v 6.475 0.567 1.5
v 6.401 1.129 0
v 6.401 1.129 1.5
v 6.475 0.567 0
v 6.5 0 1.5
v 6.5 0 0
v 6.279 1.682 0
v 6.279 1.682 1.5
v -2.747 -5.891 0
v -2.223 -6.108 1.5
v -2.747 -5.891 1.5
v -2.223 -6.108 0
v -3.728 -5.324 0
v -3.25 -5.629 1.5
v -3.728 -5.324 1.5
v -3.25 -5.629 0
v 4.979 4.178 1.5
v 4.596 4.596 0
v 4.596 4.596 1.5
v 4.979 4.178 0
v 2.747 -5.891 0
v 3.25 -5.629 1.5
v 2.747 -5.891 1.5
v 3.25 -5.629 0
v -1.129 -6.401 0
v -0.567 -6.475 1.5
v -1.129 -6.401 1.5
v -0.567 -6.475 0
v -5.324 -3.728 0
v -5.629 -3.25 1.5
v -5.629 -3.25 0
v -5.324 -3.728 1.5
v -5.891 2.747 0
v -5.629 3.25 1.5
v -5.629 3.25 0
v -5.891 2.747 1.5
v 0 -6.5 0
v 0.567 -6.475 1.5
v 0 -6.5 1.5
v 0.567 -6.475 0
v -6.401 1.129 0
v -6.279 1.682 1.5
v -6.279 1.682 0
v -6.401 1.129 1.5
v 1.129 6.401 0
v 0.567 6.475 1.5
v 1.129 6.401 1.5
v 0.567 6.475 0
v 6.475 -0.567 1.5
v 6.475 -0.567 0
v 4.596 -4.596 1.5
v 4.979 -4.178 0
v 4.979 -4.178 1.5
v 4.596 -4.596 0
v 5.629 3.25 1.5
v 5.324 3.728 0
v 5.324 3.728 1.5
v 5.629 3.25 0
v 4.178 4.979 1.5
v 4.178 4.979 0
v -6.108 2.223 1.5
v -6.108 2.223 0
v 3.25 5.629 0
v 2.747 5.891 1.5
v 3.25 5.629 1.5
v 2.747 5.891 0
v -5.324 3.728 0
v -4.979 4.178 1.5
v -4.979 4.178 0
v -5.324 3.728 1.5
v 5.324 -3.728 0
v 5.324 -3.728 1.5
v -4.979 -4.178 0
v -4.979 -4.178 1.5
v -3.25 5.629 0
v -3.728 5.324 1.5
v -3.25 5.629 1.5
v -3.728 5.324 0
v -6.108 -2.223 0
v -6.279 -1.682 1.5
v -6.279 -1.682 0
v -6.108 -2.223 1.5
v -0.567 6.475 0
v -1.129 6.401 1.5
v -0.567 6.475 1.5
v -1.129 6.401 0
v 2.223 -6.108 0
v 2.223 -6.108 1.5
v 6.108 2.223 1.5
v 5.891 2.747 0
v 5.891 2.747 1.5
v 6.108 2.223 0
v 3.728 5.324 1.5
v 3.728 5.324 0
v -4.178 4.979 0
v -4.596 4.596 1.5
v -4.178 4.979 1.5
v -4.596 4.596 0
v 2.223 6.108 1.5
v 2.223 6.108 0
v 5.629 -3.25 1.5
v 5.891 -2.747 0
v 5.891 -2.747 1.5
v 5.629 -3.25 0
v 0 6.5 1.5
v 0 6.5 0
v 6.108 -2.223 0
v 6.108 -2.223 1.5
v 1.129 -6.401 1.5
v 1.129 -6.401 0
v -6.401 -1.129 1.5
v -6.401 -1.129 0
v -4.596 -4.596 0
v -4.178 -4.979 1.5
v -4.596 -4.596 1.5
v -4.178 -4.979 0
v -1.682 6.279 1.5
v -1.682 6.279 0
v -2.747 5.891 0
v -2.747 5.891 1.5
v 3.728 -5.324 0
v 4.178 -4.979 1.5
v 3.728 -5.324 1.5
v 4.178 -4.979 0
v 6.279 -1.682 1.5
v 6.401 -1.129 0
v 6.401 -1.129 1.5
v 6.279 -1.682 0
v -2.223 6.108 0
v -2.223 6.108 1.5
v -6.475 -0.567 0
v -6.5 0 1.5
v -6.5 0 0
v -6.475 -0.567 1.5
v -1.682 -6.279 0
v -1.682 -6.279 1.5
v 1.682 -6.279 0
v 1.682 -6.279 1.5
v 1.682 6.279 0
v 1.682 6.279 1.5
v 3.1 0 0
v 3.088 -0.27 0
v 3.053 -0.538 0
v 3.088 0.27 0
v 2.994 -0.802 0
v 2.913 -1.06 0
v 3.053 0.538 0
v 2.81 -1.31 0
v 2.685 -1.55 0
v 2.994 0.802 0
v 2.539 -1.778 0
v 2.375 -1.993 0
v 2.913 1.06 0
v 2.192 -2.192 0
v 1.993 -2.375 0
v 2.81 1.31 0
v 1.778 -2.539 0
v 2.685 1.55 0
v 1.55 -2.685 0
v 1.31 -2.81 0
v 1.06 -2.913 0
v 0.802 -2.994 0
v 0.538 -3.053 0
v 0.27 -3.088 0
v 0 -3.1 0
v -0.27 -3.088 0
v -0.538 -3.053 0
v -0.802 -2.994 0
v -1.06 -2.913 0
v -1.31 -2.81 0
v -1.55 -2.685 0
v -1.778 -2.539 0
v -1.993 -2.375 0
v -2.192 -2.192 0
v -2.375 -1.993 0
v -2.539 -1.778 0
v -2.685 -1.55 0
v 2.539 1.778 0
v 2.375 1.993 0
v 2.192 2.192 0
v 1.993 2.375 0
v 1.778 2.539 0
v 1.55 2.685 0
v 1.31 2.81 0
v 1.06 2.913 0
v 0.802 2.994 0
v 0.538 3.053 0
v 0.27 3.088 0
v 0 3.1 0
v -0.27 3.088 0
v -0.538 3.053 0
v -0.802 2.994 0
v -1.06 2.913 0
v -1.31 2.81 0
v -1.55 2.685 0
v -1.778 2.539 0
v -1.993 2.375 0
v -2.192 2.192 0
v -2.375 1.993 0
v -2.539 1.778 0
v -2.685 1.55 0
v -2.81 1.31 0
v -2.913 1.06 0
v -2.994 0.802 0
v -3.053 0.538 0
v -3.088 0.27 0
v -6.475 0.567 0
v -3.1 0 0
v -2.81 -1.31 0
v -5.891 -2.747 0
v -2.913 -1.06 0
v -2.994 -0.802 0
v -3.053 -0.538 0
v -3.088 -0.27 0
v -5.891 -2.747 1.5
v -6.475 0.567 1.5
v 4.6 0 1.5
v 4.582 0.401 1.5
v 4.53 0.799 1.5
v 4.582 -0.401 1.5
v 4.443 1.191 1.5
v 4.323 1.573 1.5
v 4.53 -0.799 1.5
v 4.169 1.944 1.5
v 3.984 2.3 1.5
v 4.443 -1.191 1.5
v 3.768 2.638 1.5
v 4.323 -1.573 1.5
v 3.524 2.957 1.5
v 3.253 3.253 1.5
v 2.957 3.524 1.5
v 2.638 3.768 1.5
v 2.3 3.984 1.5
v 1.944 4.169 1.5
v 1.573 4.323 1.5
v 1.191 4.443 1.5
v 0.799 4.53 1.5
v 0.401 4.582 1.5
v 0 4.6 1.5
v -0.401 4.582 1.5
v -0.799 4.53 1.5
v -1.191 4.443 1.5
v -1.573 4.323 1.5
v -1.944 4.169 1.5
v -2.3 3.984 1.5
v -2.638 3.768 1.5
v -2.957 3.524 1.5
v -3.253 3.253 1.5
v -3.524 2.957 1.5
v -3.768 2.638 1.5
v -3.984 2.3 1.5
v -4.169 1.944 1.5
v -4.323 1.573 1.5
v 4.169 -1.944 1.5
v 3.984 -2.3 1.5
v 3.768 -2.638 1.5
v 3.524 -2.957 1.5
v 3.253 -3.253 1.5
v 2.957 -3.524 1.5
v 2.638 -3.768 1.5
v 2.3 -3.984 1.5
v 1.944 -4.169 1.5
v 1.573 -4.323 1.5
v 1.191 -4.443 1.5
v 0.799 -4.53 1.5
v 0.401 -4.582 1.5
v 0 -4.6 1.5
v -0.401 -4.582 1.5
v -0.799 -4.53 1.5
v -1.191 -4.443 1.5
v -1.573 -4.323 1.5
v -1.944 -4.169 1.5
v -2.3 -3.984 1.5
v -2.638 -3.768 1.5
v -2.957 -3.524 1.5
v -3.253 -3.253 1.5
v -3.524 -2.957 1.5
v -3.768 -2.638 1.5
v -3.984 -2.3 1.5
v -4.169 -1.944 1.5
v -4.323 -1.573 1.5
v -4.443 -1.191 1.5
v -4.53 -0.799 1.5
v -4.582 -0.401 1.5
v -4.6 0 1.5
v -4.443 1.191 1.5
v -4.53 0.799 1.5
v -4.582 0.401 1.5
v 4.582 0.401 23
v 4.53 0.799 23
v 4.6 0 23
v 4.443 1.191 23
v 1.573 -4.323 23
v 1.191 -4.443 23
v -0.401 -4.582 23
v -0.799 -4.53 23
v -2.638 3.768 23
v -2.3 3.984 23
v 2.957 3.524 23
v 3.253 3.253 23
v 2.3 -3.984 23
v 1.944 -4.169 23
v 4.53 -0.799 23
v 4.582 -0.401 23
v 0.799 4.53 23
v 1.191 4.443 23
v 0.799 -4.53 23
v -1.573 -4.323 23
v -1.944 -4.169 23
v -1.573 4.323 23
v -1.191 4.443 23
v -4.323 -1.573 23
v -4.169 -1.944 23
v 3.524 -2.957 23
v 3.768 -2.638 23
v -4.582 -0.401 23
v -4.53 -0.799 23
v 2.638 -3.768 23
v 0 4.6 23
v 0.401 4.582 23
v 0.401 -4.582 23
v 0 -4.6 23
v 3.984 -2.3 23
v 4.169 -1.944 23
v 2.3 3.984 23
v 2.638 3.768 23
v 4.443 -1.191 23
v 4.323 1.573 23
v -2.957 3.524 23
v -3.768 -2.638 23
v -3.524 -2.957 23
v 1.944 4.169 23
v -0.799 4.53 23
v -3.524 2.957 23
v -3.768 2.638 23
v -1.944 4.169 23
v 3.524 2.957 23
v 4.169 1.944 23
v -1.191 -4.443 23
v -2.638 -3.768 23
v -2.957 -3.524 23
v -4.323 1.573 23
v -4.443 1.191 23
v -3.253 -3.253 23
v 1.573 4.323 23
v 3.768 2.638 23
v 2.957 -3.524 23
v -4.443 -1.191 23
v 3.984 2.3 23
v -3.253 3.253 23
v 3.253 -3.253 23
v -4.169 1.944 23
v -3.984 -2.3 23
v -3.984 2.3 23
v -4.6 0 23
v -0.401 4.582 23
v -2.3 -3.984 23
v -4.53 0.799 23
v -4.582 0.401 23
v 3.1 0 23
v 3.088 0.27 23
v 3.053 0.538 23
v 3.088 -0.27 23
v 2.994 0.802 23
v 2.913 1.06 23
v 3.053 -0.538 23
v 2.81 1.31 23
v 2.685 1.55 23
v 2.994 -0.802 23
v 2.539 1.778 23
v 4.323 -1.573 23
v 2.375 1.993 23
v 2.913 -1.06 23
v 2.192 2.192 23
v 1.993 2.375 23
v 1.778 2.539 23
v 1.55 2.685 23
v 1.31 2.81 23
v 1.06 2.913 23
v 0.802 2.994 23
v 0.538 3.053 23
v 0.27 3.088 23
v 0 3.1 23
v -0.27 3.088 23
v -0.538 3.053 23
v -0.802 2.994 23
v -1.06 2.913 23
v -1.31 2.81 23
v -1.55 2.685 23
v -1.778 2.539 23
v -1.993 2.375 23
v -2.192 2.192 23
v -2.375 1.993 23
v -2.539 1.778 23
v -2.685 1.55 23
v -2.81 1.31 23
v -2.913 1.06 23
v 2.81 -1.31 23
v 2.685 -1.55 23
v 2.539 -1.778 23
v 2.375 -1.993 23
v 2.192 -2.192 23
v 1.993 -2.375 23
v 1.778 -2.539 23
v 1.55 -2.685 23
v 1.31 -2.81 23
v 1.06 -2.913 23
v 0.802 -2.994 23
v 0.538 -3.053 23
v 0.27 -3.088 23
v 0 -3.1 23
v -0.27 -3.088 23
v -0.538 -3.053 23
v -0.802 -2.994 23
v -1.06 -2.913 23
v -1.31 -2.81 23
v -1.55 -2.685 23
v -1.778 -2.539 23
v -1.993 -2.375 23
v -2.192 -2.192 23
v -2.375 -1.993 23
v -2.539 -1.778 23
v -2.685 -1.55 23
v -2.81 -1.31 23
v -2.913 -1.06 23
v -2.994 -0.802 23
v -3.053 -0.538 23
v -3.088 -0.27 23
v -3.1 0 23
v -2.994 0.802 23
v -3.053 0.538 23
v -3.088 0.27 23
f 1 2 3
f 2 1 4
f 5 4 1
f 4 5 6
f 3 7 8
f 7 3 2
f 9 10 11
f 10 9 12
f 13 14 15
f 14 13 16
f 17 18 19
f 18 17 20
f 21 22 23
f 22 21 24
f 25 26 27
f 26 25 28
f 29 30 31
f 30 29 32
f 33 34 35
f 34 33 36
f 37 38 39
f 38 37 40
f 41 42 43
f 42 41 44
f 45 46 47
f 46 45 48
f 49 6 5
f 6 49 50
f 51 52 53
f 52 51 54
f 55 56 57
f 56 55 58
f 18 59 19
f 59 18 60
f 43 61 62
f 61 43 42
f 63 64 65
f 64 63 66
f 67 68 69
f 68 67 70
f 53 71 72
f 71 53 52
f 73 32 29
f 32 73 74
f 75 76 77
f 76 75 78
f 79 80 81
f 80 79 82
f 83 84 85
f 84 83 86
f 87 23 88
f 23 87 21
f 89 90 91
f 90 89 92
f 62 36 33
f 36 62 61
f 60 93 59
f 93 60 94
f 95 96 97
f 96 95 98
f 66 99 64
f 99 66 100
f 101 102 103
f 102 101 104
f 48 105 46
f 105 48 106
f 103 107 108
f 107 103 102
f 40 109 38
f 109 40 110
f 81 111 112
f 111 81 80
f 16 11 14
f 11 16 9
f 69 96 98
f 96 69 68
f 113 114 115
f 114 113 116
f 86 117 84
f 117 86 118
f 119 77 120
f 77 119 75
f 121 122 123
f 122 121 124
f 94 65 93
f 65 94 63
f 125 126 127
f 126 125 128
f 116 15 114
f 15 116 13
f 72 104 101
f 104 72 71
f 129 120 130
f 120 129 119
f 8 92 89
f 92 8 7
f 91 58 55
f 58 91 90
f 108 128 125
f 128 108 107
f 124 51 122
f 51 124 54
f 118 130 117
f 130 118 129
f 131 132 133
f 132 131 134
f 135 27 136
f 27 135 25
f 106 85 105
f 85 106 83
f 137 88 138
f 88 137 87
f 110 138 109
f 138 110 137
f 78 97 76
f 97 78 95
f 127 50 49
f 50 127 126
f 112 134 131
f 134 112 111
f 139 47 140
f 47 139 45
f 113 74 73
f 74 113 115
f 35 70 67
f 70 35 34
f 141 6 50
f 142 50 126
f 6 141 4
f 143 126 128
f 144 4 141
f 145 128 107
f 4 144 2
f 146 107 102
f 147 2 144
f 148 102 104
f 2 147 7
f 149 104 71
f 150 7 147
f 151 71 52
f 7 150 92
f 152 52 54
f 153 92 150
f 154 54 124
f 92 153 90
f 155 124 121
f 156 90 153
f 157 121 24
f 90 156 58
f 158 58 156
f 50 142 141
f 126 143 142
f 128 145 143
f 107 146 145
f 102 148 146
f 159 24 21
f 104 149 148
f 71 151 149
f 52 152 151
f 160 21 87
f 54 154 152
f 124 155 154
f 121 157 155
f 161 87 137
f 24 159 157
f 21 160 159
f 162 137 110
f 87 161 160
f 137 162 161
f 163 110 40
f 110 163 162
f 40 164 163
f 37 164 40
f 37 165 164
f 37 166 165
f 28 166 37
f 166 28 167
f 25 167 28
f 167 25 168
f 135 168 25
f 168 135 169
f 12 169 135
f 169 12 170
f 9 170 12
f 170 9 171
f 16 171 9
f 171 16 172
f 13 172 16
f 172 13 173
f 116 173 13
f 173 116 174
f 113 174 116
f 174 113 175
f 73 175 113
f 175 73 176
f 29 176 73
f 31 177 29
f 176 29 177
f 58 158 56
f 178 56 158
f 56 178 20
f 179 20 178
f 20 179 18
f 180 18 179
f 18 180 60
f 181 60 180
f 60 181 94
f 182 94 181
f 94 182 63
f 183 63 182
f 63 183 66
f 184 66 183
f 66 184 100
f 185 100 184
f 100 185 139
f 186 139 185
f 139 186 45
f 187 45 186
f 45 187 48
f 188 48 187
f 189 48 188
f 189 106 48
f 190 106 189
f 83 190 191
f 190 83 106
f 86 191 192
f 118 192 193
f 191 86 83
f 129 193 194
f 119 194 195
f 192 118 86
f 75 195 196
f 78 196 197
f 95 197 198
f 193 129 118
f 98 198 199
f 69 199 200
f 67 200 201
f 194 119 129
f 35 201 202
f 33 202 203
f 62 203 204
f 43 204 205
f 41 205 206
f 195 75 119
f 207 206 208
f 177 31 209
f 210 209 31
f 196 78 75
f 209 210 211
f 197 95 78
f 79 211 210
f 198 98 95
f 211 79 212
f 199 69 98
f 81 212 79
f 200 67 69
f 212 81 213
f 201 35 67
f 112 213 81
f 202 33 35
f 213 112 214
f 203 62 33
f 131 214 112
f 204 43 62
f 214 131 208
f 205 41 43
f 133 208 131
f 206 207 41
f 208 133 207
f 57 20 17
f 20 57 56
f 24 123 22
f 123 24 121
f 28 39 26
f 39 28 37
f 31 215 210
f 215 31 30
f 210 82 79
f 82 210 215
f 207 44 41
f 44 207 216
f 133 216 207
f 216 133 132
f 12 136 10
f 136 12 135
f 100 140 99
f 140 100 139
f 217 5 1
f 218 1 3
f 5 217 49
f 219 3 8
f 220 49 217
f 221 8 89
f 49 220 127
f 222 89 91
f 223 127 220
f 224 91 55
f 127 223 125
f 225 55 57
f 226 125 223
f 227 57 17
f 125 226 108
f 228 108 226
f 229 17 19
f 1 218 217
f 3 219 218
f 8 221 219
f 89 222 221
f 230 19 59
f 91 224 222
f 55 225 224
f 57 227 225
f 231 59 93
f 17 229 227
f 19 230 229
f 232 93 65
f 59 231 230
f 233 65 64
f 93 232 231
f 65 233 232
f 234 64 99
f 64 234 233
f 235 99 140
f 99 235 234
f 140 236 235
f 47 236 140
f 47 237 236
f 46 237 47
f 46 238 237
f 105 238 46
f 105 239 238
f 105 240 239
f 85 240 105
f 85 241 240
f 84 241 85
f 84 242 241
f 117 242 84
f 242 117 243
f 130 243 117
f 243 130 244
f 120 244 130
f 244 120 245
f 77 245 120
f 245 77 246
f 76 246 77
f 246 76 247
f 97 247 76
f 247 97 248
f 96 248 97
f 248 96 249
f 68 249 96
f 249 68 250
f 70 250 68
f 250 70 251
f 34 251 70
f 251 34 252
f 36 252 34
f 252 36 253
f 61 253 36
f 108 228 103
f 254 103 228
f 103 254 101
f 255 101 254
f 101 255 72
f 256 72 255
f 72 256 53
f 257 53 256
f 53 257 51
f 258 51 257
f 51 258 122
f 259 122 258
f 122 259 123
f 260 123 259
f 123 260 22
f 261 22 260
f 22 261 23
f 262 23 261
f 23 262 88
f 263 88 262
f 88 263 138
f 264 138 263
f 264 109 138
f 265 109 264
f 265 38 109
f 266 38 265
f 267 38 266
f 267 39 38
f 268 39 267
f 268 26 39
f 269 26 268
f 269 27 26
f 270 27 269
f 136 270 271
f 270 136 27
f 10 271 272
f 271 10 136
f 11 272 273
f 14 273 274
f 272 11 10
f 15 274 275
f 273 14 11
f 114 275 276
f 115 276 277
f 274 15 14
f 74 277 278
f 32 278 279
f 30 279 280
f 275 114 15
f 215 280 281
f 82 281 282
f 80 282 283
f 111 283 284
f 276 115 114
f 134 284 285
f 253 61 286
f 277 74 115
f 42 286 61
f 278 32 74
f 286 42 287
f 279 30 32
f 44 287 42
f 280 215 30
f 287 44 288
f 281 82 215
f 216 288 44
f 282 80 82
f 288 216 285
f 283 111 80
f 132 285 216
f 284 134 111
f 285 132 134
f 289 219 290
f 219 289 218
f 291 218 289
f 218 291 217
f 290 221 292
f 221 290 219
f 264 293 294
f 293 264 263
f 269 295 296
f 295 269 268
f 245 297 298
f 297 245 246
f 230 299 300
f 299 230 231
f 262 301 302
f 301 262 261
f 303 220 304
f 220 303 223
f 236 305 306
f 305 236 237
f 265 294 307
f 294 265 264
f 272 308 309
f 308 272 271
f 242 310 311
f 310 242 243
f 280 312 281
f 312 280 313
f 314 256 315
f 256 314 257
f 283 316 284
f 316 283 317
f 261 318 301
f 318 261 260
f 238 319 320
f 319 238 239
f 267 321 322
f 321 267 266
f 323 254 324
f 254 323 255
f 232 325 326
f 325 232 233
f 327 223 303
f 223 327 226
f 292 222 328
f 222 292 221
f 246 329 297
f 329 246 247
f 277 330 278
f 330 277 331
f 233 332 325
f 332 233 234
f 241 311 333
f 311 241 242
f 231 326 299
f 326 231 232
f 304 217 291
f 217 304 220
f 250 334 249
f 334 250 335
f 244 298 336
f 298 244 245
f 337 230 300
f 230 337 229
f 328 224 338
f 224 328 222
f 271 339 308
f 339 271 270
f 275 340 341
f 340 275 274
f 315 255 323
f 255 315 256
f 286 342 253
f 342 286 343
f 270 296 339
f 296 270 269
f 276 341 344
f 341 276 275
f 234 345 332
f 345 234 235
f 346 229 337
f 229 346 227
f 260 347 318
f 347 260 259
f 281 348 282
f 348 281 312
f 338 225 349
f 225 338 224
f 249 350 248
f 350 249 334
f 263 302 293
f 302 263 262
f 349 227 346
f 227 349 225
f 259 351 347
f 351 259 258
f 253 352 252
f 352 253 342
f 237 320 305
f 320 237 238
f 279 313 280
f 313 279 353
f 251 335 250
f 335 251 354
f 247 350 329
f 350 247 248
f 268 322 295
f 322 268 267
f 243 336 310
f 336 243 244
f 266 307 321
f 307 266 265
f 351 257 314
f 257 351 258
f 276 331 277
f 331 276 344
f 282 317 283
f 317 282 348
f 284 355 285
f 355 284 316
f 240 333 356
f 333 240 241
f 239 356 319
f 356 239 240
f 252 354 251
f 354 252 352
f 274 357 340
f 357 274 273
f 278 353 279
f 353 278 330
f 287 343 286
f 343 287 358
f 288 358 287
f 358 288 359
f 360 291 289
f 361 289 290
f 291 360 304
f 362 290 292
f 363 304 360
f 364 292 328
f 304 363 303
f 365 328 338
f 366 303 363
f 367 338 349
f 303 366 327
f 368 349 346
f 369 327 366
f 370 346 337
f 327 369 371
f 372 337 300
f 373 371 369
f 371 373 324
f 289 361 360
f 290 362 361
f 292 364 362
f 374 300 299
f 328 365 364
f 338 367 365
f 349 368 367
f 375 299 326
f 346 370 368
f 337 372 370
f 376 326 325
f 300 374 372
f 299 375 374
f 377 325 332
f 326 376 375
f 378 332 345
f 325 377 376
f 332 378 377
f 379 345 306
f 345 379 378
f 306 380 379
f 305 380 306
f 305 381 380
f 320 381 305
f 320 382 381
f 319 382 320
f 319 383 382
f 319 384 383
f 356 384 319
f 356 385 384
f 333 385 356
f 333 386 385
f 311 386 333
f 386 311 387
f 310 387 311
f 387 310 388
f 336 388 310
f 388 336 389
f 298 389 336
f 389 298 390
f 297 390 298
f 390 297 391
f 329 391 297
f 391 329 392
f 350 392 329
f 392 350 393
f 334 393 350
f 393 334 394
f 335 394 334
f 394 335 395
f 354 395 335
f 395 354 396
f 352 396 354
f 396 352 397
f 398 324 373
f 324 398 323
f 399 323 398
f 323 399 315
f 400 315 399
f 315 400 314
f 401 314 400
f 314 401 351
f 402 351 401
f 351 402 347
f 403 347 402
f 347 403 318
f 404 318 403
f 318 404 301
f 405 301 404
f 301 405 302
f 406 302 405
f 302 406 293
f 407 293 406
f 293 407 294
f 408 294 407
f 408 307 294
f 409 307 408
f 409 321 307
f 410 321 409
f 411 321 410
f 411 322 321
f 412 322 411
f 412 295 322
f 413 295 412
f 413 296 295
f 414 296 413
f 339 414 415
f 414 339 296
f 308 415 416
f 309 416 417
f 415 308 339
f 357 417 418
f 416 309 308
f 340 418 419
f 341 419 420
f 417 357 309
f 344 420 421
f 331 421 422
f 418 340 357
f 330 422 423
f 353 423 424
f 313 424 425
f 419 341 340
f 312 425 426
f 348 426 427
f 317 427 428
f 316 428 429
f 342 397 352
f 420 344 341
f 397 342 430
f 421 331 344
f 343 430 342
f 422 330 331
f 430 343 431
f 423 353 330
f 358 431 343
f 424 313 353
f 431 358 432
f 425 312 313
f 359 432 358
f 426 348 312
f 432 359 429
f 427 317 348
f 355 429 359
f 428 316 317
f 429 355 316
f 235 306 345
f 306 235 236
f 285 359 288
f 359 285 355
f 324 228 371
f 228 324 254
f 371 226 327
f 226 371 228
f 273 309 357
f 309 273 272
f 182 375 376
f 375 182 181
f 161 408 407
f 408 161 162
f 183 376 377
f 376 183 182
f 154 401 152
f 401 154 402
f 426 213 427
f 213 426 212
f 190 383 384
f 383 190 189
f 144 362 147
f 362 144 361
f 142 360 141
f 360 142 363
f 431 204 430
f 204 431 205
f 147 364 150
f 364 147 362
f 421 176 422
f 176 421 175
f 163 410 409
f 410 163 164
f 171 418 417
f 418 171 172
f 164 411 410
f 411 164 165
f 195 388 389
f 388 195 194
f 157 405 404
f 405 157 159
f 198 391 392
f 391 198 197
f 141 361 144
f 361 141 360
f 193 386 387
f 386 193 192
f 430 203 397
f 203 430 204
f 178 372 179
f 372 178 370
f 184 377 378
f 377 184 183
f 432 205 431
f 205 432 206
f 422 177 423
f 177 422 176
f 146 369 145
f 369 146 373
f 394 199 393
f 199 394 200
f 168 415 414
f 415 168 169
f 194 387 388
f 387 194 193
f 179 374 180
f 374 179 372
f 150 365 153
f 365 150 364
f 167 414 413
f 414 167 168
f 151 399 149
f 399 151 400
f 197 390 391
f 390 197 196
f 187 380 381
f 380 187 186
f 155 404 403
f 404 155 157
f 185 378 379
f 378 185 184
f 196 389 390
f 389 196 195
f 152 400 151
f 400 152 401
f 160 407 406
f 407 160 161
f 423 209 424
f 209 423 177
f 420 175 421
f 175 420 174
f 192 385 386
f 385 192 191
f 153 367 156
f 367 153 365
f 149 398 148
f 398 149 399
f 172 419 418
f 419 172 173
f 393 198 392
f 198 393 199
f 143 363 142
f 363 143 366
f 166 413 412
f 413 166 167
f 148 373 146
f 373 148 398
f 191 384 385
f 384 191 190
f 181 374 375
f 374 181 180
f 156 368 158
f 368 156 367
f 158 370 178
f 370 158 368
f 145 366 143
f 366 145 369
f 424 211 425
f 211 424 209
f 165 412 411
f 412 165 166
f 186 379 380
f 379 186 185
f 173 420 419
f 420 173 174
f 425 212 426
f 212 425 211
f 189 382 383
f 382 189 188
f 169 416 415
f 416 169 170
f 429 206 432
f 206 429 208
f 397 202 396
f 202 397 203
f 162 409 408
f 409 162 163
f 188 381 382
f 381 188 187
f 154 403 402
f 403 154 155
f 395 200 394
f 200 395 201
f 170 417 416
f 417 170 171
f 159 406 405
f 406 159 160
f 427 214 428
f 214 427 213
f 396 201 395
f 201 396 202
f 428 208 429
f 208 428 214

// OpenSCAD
// Adapter sleeve - a collar with a tube sleeve, for adapting a smaller tube to a rack
// made for a larger tube (e.g. a 0.2 mL PCR tube in a 1.5 mL tube rack). NOVEL part.
//

top     = 13;
clearance = 1.5;
sleeve_h = 21.5;
bore     = 6.2;

$fn = 72;

t = 1.5;

difference() {
    union() {
        cylinder(h = t, d = top);                 // collar (contact the rack surface)
        translate([0, 0, t]) cylinder(h = sleeve_h, d = bore + 2 * clearance);   // sleeve below the collar
    }
    translate([0, 0, -1]) cylinder(h = t + sleeve_h + 2, d = bore);                     // through-bore
}
